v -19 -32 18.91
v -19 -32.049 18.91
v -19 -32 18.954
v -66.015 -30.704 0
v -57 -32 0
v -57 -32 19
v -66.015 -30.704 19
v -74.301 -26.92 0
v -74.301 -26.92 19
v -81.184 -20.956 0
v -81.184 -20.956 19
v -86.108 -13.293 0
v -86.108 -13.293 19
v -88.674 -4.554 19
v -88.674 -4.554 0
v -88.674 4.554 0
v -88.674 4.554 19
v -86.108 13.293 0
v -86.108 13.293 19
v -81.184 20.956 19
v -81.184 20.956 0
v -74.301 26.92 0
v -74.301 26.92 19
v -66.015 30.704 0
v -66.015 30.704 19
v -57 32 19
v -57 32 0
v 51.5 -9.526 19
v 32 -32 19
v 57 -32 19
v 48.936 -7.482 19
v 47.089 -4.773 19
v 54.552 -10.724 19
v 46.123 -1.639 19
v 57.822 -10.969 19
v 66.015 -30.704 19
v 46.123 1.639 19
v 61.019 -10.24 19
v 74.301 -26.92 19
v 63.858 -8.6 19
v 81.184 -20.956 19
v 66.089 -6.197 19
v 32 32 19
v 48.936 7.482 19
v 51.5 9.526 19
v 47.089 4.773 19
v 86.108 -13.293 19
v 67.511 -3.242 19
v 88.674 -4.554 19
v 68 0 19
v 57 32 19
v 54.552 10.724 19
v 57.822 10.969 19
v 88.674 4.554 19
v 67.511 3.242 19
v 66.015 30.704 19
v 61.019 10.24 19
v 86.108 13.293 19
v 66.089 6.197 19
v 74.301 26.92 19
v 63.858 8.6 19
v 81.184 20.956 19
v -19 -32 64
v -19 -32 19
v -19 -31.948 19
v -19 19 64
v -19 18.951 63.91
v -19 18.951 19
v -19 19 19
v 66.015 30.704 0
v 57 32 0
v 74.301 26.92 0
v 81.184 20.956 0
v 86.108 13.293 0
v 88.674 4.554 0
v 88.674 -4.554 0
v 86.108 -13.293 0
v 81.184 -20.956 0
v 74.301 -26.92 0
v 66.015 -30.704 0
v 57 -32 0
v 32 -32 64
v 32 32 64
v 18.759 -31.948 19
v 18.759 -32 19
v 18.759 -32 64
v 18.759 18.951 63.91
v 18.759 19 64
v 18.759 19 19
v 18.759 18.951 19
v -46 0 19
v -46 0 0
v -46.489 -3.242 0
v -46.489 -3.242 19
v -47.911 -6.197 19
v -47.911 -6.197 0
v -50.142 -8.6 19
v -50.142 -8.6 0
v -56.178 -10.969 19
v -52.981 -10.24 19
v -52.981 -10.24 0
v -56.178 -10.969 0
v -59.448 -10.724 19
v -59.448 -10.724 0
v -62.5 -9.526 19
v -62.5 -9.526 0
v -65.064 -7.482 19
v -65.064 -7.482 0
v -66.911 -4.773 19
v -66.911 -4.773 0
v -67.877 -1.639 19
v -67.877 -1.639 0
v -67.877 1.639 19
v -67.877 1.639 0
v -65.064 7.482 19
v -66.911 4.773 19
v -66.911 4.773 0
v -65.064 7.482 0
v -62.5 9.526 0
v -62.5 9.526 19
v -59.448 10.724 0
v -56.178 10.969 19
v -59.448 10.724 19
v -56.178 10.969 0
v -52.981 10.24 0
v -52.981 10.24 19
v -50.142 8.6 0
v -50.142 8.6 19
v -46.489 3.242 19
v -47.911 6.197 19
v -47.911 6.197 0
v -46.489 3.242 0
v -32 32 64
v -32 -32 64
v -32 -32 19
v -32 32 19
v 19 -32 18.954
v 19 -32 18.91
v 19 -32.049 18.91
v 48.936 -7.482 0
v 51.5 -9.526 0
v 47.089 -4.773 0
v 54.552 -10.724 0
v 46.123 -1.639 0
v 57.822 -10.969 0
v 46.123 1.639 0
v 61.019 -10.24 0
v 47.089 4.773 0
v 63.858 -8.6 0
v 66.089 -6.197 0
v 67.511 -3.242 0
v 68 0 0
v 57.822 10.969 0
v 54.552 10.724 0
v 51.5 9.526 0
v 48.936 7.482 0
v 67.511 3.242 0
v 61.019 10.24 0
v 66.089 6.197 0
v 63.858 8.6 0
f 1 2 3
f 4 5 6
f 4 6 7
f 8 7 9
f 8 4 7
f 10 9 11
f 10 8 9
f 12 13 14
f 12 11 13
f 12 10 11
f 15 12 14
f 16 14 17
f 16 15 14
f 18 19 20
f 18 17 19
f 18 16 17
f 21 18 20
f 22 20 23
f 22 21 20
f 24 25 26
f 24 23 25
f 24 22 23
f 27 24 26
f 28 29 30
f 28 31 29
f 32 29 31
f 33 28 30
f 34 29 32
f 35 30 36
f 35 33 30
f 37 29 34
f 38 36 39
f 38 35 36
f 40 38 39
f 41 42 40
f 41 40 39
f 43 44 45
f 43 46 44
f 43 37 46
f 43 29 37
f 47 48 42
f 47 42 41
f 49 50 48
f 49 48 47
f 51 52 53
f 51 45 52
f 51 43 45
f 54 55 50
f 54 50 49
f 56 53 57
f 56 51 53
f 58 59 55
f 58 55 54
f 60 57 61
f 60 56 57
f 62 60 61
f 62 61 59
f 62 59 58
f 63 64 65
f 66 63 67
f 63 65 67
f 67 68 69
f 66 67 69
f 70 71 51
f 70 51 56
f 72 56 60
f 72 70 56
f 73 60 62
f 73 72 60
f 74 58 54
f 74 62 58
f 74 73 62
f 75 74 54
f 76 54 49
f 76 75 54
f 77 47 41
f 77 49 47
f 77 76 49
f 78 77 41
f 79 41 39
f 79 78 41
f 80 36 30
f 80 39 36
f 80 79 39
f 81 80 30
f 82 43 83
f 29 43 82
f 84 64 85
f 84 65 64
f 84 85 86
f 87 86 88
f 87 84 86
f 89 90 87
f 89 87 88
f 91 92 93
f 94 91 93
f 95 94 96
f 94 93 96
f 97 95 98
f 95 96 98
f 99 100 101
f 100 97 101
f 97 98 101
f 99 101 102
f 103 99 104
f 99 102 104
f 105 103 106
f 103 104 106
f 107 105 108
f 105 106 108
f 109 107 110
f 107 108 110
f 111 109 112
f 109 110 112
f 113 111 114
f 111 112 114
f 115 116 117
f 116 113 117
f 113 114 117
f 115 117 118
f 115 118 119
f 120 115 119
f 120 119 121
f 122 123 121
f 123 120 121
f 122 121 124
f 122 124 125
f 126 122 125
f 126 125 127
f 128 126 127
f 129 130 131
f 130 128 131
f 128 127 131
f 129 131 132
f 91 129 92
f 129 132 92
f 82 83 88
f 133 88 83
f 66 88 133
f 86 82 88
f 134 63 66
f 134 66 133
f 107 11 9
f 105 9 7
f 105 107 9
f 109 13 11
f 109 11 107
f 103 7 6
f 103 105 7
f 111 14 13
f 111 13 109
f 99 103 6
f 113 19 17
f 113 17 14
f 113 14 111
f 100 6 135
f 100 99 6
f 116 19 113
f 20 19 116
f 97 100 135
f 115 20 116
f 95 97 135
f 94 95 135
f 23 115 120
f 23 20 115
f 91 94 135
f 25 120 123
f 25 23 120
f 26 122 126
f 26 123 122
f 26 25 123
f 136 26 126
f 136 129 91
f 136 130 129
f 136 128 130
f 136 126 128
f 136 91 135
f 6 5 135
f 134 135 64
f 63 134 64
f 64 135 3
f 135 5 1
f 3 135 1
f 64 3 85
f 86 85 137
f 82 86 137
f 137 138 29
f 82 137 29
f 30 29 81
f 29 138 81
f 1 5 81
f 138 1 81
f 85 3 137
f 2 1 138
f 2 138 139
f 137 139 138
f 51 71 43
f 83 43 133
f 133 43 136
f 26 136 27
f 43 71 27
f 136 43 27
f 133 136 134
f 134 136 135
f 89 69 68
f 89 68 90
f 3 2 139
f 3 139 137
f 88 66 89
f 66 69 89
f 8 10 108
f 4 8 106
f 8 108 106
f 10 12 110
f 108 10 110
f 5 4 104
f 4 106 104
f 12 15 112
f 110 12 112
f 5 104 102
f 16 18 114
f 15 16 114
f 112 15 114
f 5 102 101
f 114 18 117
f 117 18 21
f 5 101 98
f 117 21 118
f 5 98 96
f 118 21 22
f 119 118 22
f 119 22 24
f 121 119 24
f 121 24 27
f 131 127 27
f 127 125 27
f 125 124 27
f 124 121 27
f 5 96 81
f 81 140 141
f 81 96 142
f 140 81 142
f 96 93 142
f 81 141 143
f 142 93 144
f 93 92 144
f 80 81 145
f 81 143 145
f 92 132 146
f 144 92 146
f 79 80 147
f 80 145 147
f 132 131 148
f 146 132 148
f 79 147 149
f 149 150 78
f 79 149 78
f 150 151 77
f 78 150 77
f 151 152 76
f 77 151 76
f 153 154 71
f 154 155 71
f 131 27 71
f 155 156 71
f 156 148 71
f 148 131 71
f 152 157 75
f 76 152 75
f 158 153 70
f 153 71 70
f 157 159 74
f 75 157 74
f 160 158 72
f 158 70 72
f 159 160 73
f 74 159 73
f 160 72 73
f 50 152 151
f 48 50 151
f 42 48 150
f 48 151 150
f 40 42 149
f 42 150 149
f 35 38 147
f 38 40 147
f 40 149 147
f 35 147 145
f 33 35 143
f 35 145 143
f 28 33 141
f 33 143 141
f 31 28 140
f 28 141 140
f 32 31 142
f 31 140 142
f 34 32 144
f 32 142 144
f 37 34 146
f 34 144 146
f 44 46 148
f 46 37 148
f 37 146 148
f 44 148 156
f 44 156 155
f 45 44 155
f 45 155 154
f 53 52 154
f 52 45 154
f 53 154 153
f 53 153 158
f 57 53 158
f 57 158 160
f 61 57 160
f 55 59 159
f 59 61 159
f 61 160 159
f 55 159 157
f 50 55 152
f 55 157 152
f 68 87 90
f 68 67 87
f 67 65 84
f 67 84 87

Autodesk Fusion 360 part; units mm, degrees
sketch "Base_Sketch" plane through (0, 0, 0) normal (0, 0, 1) x (1, 0, 0)
  line L0 (57, 32) -> (-57, 32)
  line L1 (-57, -32) -> (57, -32)
  circle A0 centre (-57, 0) radius 11
  circle A1 centre (57, 0) radius 11
  arc A2 (-57, 32) -> (-57, -32) centre (-57, 0) ccw
  arc A3 (57, -32) -> (57, 32) centre (57, 0) ccw
  dimension "d1" = 114
  dimension "d2" = 64
  dimension "d3" = 32
  dimension "d4" = 32
extrude "Extrude1" add sketch "Base_Sketch" along normal blind 19
sketch "Top_Base_Sketch" plane through (0, 0, 19) normal (0, 0, 1) x (-1, 0, 0)
  circle A0 centre (-57, 0) radius 11
  circle A1 centre (57, 0) radius 11
  arc A2 (-57, 32) -> (-57, -32) centre (-57, 0) ccw
  line L0 (-57, -32) -> (57, -32)
  arc A3 (57, -32) -> (57, 32) centre (57, 0) ccw
  line L1 (57, 32) -> (-57, 32)
  line L2 (32, -32) -> (32, 32)
  line L3 (-32, -32) -> (-32, 32)
  line L4 (19, 32) -> (19, -19)
  line L5 (-18.7586, 32) -> (-18.7586, -19)
  line L6 (19, -19) -> (-19, -19)
  line L7 (32, 32) -> (19, 32) construction
  line L8 (32, -32) -> (-32, -32) construction
  line L9 (-18.7586, 32) -> (-32, 32) construction
  dimension "d9" = 64
  dimension "d11" = 51
  dimension "d12" = 51
  dimension "d13" = 38
  dimension "d15" = 13
extrude "Extrude2" add sketch "Top_Base_Sketch" along normal blind 45 contours L0 L1 L2 L3 L4 L5 L6
sketch "Triangle_Sketch" plane through (0, 0, 0) normal (1, 0, 0) x (0, 1, 0)
  line L0 (18.9506, 63.9102) -> (18.9506, 18.9102)
  line L1 (18.9506, 18.9102) -> (-32.0494, 18.9102)
  line L2 (-32.0494, 18.9102) -> (18.9506, 63.9102)
  dimension "d18" = 45
  dimension "d20" = 51
extrude "Extrude3" add sketch "Triangle_Sketch" along normal mid plane 38
